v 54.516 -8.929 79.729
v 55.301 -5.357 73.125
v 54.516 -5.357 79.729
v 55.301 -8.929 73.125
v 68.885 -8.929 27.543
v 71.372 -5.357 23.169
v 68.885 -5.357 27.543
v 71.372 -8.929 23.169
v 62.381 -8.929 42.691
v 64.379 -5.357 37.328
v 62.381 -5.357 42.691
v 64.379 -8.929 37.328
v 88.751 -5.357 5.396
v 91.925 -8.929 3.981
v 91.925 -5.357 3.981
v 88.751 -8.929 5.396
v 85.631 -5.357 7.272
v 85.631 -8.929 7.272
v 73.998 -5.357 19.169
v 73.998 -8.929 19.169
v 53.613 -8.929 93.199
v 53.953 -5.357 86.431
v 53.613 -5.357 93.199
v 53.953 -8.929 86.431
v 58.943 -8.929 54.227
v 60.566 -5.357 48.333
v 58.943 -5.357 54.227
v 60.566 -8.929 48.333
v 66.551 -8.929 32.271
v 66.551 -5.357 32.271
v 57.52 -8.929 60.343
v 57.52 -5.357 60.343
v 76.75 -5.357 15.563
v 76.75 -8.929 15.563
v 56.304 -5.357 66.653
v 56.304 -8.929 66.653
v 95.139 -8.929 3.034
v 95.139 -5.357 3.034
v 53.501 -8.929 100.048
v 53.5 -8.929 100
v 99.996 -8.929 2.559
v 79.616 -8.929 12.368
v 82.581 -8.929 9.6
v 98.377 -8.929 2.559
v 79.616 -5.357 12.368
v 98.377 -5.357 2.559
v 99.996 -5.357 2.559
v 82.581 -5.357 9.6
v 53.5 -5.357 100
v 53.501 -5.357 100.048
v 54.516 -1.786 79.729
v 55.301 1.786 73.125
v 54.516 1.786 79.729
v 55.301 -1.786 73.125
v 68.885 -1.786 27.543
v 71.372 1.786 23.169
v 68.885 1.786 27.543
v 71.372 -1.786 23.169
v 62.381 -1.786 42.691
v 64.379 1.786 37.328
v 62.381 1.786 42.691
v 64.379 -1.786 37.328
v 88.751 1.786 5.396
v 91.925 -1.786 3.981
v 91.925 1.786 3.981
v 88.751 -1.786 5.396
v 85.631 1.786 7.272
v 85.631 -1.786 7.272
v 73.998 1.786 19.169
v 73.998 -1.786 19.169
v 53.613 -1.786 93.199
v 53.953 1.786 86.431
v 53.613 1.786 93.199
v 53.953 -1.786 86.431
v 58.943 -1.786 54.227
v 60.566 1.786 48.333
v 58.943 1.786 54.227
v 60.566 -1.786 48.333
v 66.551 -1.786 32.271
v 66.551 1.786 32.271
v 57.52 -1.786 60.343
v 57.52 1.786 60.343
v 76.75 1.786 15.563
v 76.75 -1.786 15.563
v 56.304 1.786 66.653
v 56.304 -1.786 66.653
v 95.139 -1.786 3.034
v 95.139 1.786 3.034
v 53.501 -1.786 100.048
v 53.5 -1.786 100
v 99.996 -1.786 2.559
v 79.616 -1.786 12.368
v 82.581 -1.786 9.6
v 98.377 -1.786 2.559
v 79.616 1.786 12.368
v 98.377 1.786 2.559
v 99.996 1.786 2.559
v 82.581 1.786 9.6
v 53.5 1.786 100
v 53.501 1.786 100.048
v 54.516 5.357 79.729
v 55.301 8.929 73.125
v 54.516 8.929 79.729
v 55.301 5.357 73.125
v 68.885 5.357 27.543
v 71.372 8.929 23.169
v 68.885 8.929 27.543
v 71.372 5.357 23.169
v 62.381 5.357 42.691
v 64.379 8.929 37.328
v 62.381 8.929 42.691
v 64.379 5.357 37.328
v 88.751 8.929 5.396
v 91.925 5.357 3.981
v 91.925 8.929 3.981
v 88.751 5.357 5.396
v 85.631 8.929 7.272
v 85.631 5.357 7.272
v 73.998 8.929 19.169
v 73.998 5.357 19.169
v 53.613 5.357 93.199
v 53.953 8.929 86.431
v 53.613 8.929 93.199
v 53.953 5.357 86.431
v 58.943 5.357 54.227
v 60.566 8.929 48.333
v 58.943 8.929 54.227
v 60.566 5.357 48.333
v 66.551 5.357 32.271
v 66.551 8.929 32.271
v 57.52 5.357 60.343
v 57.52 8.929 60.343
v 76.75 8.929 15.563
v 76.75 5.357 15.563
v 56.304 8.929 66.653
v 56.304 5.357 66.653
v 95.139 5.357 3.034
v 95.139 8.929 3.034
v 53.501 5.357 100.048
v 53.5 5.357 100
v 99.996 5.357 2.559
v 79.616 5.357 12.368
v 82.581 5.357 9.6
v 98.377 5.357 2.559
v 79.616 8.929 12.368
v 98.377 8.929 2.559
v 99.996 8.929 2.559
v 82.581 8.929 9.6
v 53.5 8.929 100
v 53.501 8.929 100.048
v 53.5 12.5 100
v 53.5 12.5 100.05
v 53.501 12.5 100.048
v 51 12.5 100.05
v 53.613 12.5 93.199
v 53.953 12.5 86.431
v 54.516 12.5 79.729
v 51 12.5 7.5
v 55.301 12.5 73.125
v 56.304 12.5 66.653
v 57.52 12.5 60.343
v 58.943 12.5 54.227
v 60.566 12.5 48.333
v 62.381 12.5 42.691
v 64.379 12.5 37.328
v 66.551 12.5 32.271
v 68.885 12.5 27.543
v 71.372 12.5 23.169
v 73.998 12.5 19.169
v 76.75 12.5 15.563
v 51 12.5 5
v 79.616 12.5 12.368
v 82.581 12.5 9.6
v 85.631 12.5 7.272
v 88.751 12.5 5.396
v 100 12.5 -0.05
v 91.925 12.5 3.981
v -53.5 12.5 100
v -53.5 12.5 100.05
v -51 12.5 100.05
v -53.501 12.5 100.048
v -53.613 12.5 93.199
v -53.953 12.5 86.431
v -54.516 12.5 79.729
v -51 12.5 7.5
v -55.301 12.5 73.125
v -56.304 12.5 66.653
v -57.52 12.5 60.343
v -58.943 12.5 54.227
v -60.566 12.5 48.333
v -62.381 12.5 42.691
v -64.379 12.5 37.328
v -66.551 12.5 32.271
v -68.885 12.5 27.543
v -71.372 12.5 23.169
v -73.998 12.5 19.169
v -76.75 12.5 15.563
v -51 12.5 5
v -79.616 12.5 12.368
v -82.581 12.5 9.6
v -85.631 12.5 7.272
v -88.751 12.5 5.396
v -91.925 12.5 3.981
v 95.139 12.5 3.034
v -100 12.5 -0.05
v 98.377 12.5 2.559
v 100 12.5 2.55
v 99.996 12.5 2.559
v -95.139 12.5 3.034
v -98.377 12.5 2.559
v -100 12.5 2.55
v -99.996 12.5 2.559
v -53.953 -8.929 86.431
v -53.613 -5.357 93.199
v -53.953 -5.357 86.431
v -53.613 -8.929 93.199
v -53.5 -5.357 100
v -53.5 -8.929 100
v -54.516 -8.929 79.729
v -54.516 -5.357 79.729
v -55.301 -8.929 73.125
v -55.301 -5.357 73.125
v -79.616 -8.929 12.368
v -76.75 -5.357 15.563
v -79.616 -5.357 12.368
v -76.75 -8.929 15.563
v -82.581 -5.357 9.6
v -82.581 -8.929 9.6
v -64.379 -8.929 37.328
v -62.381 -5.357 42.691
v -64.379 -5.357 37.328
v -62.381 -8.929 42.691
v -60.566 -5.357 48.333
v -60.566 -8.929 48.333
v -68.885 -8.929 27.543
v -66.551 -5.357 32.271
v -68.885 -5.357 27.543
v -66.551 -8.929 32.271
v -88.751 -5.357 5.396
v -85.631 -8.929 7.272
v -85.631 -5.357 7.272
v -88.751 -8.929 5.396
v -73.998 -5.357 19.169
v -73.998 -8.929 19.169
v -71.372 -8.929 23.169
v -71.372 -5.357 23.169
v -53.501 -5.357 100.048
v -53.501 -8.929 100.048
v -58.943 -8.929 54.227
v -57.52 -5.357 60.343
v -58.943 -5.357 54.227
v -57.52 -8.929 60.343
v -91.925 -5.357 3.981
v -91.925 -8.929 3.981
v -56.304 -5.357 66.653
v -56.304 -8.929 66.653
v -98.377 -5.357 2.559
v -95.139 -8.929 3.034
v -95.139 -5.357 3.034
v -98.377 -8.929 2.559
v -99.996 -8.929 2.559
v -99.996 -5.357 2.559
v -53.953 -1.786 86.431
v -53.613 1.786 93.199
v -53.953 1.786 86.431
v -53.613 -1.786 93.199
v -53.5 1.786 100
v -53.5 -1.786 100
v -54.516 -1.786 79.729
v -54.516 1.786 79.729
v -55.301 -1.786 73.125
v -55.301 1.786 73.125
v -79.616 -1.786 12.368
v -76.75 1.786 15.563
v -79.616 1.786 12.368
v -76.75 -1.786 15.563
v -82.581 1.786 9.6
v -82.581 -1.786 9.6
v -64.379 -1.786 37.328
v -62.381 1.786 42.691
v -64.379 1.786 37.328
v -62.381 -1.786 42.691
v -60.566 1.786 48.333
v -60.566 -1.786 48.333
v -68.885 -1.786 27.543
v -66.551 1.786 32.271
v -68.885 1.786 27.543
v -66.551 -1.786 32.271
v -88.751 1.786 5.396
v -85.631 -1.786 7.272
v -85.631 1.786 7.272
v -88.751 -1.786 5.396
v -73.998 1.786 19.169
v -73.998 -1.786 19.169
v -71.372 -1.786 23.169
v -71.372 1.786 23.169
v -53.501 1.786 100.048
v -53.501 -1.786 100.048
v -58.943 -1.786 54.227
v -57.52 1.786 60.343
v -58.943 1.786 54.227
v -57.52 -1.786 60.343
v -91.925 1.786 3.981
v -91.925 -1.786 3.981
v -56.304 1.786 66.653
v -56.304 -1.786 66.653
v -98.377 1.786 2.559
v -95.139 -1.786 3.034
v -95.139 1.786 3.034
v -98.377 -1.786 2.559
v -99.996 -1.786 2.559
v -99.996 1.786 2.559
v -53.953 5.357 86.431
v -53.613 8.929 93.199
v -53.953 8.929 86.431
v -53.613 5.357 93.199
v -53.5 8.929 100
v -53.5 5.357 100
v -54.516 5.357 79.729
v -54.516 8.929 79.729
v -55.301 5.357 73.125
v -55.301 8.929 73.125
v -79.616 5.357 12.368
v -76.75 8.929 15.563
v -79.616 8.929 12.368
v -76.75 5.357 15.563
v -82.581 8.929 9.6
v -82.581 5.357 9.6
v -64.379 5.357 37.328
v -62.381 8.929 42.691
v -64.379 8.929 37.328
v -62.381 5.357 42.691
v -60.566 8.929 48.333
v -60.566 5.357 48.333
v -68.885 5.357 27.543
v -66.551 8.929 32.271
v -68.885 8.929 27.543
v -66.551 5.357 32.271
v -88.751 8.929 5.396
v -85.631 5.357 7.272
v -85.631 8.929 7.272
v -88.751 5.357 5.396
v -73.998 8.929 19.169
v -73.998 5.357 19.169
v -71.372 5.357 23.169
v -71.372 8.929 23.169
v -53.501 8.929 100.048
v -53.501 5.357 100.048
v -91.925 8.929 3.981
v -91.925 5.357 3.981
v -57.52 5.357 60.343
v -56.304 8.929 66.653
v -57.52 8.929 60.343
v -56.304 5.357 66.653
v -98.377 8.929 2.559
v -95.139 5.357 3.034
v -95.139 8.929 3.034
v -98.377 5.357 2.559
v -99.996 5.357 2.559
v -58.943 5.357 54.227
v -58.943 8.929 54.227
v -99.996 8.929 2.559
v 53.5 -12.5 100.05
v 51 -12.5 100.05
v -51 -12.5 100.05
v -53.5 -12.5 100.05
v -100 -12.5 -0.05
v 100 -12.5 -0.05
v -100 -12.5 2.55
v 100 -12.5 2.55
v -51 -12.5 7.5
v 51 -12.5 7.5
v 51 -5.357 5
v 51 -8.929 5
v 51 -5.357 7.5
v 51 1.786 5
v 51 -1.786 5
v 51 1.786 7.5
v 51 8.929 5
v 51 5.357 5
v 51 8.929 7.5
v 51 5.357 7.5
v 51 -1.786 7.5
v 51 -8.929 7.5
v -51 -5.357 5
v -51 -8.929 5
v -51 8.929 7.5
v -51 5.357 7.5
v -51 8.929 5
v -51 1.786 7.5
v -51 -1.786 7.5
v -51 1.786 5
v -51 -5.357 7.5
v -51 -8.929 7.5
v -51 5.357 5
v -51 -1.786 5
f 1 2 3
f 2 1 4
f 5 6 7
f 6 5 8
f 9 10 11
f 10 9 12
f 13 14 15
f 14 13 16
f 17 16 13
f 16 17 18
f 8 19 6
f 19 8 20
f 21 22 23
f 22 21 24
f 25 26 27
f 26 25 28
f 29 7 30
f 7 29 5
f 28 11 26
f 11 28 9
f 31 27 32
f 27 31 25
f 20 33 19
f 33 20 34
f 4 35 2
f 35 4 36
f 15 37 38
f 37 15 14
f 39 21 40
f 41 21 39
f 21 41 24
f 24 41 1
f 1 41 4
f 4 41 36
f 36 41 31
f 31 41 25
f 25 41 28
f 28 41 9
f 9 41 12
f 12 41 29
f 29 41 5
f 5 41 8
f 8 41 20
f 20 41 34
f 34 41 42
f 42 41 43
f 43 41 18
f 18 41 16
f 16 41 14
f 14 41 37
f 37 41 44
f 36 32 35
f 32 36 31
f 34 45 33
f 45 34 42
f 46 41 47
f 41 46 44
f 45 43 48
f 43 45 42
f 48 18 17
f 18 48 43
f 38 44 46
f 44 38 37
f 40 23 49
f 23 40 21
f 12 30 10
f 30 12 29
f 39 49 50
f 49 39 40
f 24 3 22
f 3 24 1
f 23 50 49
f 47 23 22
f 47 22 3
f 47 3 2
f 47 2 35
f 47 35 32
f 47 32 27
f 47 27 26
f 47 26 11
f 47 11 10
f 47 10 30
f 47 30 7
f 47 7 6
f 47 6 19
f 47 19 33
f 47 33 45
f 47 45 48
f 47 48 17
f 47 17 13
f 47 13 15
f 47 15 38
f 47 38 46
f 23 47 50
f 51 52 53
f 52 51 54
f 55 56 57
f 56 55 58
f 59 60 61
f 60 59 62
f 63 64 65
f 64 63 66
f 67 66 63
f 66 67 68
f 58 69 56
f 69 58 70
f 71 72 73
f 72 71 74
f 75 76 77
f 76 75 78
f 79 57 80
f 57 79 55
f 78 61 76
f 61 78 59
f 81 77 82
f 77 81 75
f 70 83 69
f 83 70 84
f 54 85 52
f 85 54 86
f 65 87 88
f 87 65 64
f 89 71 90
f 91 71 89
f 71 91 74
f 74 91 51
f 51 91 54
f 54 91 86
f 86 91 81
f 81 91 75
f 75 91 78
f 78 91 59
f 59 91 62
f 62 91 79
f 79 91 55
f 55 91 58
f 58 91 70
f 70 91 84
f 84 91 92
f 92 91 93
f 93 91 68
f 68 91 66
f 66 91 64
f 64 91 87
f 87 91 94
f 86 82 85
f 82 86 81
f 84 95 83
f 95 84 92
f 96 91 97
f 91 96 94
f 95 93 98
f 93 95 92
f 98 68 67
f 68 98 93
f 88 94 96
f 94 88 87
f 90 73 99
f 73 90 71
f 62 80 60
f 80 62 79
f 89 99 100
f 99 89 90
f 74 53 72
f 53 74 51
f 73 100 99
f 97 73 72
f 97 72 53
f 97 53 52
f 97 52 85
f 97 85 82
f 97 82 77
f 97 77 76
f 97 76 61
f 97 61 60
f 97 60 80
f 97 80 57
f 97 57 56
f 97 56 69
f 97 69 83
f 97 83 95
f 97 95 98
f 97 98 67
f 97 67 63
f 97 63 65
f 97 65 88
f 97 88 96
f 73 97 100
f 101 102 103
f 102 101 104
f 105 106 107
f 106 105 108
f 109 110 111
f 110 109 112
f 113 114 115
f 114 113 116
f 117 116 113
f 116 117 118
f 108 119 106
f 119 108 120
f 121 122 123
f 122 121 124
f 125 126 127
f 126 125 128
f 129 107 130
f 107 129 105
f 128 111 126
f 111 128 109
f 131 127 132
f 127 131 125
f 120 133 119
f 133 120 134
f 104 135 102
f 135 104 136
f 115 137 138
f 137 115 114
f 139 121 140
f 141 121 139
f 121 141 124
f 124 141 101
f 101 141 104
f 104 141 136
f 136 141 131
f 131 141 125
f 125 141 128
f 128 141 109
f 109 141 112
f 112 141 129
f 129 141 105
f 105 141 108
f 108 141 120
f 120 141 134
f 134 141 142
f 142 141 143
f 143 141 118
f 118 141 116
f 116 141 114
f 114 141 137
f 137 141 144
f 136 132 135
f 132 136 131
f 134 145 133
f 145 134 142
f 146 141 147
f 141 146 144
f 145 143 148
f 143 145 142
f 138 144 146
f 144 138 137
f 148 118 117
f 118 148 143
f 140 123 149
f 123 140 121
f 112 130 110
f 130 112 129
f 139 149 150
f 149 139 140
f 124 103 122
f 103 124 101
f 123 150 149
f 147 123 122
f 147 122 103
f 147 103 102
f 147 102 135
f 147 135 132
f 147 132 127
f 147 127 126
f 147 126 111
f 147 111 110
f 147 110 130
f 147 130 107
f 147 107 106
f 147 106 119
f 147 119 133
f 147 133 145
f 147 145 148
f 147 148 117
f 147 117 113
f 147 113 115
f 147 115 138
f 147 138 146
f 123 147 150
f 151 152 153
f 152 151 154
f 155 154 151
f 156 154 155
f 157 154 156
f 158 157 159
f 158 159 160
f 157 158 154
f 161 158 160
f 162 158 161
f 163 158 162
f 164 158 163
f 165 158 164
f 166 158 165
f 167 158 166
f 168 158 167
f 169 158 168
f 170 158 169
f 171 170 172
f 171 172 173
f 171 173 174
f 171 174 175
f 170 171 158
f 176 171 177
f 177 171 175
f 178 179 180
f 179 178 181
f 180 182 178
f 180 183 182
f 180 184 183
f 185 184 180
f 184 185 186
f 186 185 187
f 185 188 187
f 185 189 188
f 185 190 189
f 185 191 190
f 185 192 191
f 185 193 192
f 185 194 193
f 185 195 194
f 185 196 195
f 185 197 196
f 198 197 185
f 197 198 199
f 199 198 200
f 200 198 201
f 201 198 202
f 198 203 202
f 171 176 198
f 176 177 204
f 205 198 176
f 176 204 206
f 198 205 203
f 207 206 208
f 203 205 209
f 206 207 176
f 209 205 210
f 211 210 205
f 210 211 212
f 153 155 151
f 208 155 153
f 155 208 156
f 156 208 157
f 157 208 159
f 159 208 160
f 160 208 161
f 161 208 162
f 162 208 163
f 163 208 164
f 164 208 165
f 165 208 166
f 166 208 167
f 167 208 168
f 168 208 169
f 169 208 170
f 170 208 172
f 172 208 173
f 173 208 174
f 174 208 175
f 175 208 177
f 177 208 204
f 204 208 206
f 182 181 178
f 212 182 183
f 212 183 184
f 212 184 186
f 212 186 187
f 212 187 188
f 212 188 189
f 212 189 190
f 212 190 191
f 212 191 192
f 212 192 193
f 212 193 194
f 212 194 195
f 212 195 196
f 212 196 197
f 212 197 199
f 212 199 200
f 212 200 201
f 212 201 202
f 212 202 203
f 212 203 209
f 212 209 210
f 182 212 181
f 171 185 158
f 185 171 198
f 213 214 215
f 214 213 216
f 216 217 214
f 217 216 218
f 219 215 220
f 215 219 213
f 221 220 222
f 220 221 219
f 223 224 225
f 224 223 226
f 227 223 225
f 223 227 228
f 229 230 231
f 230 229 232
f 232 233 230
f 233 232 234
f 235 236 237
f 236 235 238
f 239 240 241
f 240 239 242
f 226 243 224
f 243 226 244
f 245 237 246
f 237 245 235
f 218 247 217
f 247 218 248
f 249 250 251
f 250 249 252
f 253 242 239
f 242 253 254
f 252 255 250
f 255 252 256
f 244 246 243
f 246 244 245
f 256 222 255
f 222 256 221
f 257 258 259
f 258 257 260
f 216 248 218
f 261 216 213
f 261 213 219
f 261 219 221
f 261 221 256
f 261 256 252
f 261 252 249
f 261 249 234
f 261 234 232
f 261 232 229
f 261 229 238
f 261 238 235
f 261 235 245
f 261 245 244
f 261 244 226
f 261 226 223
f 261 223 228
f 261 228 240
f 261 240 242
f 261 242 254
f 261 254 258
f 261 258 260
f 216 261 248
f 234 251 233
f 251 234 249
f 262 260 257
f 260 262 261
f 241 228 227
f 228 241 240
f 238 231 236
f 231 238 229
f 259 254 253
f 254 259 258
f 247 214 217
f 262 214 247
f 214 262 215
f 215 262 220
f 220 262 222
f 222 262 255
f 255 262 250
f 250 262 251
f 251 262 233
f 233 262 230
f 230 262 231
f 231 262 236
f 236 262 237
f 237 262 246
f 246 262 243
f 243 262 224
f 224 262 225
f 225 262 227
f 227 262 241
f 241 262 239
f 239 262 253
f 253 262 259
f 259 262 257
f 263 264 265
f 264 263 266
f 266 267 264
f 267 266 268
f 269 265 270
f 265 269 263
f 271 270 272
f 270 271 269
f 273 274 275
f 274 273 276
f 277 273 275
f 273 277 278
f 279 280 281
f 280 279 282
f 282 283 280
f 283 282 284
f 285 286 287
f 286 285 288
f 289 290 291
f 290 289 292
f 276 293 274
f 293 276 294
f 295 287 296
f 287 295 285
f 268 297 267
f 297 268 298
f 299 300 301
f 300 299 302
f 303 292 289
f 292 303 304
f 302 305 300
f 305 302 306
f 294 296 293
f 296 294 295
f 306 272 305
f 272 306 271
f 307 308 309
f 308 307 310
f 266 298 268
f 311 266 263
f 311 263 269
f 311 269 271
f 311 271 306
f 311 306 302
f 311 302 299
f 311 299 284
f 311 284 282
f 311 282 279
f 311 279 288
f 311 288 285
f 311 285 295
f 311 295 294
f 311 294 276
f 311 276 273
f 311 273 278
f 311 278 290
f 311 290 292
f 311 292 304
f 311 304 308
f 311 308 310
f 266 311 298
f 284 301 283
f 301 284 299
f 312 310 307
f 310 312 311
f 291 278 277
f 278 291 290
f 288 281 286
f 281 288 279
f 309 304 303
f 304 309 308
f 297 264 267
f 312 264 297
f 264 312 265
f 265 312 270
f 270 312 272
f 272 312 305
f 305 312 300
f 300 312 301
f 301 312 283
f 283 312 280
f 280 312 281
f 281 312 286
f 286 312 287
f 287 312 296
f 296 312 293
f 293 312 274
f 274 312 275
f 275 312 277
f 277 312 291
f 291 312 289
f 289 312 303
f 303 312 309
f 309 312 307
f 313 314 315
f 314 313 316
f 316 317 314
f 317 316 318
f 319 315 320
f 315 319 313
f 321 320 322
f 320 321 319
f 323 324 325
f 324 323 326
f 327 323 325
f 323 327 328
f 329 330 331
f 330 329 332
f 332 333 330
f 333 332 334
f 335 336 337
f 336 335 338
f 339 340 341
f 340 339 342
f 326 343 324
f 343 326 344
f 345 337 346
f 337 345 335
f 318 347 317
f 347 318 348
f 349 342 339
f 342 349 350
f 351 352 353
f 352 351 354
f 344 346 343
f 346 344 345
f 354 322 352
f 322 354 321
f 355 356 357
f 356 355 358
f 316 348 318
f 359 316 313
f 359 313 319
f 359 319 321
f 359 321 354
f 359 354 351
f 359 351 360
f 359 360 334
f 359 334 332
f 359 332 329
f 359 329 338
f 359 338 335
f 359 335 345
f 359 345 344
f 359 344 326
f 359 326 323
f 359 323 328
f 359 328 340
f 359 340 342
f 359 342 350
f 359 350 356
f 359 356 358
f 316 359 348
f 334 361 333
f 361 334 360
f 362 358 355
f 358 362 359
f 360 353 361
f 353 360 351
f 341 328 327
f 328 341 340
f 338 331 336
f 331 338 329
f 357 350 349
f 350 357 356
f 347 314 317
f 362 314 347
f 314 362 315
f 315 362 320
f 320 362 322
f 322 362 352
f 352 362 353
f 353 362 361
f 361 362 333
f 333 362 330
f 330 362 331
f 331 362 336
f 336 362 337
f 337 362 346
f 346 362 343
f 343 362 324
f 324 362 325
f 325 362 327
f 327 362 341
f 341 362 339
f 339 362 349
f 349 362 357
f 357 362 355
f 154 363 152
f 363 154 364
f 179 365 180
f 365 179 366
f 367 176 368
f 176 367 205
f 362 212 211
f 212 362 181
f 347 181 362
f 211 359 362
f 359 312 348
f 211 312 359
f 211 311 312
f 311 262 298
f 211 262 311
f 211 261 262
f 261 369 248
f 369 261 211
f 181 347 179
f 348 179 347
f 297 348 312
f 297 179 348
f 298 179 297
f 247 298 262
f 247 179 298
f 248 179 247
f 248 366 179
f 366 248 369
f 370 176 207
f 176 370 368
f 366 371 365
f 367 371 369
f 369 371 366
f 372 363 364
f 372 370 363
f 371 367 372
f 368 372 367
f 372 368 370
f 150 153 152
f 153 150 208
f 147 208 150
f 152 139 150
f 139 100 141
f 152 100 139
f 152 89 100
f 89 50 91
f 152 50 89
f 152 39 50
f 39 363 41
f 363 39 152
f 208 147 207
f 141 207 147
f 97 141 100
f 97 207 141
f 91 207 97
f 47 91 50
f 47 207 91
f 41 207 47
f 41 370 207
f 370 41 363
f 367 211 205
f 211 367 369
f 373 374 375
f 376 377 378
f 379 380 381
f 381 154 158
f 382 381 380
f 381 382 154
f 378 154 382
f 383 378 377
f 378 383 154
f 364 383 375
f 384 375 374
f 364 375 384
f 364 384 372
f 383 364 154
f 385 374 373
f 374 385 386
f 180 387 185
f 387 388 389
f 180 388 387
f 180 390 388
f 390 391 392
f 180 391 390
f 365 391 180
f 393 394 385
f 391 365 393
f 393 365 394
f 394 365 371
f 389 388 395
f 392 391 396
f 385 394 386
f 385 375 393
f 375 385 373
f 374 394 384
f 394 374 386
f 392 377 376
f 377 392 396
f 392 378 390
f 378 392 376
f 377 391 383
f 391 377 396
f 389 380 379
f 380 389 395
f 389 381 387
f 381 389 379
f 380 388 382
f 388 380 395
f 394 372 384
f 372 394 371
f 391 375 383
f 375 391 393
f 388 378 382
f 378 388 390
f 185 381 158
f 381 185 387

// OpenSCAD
// Depth of the stand, in mm. 
StandDepth = 25;

// Total height of the stand
StandHeight = 100;

// Width of the base of the stand
BaseWidth = 200;

// Width of the slot in the stand. Must be smaller than the width of the base.
SlotWidth = 102;

// Height of the connecting bridge between the two vertical supports. 
BaseHeight = 7.5;

// Size of the edges on the top and side.
MinEdgeWidth = 2.5;

// Number of ridges in the support.
NrRidges = 4;

/* [Hidden] */
 ridgeWidth = StandDepth / (2 * NrRidges - 1);
 
module ridgeDuplicator() {
    for (y = [-StandDepth/2 + ridgeWidth : 2*ridgeWidth : StandDepth/2])
            translate([0,y, 0])
                children(0);
}

module slot() {
    translate([-SlotWidth/2, 0 , BaseHeight]) 
        union() {
             translate([ 0, -StandDepth/2 - .5 , 0]) cube([SlotWidth, StandDepth + 1, StandHeight - BaseHeight + .5]); 
              ridgeDuplicator() 
                 translate([0,0,-MinEdgeWidth])
                    cube([SlotWidth, ridgeWidth, MinEdgeWidth + 1]);
        }
}

module base() {
    supportWidth = (BaseWidth - SlotWidth)/2 - MinEdgeWidth;
    supportHeight = StandHeight - MinEdgeWidth;
    supportXOffset = SlotWidth / 2 +supportWidth + MinEdgeWidth;
    supportZOffset = supportHeight + MinEdgeWidth;
    
    module cutOut() {
        ridgeDuplicator()
             scale([supportWidth, ridgeWidth, supportHeight])rotate(a=90, v=[-1,0,0] ) cylinder( $fn=90);
    }
    
    difference() {
        hull() {
            cube([BaseWidth, StandDepth, .1], center=true);
            translate([0,0, MinEdgeWidth]) cube([BaseWidth, StandDepth, .1], center=true);
            translate([0,0,StandHeight]) cube([SlotWidth + 2*MinEdgeWidth, StandDepth, .1], center=true);
        }
        translate([supportXOffset, 0, supportZOffset]) cutOut();
        translate([-supportXOffset, 0, supportZOffset]) cutOut();
    }
}

difference() {
    base();
    slot();   
}
